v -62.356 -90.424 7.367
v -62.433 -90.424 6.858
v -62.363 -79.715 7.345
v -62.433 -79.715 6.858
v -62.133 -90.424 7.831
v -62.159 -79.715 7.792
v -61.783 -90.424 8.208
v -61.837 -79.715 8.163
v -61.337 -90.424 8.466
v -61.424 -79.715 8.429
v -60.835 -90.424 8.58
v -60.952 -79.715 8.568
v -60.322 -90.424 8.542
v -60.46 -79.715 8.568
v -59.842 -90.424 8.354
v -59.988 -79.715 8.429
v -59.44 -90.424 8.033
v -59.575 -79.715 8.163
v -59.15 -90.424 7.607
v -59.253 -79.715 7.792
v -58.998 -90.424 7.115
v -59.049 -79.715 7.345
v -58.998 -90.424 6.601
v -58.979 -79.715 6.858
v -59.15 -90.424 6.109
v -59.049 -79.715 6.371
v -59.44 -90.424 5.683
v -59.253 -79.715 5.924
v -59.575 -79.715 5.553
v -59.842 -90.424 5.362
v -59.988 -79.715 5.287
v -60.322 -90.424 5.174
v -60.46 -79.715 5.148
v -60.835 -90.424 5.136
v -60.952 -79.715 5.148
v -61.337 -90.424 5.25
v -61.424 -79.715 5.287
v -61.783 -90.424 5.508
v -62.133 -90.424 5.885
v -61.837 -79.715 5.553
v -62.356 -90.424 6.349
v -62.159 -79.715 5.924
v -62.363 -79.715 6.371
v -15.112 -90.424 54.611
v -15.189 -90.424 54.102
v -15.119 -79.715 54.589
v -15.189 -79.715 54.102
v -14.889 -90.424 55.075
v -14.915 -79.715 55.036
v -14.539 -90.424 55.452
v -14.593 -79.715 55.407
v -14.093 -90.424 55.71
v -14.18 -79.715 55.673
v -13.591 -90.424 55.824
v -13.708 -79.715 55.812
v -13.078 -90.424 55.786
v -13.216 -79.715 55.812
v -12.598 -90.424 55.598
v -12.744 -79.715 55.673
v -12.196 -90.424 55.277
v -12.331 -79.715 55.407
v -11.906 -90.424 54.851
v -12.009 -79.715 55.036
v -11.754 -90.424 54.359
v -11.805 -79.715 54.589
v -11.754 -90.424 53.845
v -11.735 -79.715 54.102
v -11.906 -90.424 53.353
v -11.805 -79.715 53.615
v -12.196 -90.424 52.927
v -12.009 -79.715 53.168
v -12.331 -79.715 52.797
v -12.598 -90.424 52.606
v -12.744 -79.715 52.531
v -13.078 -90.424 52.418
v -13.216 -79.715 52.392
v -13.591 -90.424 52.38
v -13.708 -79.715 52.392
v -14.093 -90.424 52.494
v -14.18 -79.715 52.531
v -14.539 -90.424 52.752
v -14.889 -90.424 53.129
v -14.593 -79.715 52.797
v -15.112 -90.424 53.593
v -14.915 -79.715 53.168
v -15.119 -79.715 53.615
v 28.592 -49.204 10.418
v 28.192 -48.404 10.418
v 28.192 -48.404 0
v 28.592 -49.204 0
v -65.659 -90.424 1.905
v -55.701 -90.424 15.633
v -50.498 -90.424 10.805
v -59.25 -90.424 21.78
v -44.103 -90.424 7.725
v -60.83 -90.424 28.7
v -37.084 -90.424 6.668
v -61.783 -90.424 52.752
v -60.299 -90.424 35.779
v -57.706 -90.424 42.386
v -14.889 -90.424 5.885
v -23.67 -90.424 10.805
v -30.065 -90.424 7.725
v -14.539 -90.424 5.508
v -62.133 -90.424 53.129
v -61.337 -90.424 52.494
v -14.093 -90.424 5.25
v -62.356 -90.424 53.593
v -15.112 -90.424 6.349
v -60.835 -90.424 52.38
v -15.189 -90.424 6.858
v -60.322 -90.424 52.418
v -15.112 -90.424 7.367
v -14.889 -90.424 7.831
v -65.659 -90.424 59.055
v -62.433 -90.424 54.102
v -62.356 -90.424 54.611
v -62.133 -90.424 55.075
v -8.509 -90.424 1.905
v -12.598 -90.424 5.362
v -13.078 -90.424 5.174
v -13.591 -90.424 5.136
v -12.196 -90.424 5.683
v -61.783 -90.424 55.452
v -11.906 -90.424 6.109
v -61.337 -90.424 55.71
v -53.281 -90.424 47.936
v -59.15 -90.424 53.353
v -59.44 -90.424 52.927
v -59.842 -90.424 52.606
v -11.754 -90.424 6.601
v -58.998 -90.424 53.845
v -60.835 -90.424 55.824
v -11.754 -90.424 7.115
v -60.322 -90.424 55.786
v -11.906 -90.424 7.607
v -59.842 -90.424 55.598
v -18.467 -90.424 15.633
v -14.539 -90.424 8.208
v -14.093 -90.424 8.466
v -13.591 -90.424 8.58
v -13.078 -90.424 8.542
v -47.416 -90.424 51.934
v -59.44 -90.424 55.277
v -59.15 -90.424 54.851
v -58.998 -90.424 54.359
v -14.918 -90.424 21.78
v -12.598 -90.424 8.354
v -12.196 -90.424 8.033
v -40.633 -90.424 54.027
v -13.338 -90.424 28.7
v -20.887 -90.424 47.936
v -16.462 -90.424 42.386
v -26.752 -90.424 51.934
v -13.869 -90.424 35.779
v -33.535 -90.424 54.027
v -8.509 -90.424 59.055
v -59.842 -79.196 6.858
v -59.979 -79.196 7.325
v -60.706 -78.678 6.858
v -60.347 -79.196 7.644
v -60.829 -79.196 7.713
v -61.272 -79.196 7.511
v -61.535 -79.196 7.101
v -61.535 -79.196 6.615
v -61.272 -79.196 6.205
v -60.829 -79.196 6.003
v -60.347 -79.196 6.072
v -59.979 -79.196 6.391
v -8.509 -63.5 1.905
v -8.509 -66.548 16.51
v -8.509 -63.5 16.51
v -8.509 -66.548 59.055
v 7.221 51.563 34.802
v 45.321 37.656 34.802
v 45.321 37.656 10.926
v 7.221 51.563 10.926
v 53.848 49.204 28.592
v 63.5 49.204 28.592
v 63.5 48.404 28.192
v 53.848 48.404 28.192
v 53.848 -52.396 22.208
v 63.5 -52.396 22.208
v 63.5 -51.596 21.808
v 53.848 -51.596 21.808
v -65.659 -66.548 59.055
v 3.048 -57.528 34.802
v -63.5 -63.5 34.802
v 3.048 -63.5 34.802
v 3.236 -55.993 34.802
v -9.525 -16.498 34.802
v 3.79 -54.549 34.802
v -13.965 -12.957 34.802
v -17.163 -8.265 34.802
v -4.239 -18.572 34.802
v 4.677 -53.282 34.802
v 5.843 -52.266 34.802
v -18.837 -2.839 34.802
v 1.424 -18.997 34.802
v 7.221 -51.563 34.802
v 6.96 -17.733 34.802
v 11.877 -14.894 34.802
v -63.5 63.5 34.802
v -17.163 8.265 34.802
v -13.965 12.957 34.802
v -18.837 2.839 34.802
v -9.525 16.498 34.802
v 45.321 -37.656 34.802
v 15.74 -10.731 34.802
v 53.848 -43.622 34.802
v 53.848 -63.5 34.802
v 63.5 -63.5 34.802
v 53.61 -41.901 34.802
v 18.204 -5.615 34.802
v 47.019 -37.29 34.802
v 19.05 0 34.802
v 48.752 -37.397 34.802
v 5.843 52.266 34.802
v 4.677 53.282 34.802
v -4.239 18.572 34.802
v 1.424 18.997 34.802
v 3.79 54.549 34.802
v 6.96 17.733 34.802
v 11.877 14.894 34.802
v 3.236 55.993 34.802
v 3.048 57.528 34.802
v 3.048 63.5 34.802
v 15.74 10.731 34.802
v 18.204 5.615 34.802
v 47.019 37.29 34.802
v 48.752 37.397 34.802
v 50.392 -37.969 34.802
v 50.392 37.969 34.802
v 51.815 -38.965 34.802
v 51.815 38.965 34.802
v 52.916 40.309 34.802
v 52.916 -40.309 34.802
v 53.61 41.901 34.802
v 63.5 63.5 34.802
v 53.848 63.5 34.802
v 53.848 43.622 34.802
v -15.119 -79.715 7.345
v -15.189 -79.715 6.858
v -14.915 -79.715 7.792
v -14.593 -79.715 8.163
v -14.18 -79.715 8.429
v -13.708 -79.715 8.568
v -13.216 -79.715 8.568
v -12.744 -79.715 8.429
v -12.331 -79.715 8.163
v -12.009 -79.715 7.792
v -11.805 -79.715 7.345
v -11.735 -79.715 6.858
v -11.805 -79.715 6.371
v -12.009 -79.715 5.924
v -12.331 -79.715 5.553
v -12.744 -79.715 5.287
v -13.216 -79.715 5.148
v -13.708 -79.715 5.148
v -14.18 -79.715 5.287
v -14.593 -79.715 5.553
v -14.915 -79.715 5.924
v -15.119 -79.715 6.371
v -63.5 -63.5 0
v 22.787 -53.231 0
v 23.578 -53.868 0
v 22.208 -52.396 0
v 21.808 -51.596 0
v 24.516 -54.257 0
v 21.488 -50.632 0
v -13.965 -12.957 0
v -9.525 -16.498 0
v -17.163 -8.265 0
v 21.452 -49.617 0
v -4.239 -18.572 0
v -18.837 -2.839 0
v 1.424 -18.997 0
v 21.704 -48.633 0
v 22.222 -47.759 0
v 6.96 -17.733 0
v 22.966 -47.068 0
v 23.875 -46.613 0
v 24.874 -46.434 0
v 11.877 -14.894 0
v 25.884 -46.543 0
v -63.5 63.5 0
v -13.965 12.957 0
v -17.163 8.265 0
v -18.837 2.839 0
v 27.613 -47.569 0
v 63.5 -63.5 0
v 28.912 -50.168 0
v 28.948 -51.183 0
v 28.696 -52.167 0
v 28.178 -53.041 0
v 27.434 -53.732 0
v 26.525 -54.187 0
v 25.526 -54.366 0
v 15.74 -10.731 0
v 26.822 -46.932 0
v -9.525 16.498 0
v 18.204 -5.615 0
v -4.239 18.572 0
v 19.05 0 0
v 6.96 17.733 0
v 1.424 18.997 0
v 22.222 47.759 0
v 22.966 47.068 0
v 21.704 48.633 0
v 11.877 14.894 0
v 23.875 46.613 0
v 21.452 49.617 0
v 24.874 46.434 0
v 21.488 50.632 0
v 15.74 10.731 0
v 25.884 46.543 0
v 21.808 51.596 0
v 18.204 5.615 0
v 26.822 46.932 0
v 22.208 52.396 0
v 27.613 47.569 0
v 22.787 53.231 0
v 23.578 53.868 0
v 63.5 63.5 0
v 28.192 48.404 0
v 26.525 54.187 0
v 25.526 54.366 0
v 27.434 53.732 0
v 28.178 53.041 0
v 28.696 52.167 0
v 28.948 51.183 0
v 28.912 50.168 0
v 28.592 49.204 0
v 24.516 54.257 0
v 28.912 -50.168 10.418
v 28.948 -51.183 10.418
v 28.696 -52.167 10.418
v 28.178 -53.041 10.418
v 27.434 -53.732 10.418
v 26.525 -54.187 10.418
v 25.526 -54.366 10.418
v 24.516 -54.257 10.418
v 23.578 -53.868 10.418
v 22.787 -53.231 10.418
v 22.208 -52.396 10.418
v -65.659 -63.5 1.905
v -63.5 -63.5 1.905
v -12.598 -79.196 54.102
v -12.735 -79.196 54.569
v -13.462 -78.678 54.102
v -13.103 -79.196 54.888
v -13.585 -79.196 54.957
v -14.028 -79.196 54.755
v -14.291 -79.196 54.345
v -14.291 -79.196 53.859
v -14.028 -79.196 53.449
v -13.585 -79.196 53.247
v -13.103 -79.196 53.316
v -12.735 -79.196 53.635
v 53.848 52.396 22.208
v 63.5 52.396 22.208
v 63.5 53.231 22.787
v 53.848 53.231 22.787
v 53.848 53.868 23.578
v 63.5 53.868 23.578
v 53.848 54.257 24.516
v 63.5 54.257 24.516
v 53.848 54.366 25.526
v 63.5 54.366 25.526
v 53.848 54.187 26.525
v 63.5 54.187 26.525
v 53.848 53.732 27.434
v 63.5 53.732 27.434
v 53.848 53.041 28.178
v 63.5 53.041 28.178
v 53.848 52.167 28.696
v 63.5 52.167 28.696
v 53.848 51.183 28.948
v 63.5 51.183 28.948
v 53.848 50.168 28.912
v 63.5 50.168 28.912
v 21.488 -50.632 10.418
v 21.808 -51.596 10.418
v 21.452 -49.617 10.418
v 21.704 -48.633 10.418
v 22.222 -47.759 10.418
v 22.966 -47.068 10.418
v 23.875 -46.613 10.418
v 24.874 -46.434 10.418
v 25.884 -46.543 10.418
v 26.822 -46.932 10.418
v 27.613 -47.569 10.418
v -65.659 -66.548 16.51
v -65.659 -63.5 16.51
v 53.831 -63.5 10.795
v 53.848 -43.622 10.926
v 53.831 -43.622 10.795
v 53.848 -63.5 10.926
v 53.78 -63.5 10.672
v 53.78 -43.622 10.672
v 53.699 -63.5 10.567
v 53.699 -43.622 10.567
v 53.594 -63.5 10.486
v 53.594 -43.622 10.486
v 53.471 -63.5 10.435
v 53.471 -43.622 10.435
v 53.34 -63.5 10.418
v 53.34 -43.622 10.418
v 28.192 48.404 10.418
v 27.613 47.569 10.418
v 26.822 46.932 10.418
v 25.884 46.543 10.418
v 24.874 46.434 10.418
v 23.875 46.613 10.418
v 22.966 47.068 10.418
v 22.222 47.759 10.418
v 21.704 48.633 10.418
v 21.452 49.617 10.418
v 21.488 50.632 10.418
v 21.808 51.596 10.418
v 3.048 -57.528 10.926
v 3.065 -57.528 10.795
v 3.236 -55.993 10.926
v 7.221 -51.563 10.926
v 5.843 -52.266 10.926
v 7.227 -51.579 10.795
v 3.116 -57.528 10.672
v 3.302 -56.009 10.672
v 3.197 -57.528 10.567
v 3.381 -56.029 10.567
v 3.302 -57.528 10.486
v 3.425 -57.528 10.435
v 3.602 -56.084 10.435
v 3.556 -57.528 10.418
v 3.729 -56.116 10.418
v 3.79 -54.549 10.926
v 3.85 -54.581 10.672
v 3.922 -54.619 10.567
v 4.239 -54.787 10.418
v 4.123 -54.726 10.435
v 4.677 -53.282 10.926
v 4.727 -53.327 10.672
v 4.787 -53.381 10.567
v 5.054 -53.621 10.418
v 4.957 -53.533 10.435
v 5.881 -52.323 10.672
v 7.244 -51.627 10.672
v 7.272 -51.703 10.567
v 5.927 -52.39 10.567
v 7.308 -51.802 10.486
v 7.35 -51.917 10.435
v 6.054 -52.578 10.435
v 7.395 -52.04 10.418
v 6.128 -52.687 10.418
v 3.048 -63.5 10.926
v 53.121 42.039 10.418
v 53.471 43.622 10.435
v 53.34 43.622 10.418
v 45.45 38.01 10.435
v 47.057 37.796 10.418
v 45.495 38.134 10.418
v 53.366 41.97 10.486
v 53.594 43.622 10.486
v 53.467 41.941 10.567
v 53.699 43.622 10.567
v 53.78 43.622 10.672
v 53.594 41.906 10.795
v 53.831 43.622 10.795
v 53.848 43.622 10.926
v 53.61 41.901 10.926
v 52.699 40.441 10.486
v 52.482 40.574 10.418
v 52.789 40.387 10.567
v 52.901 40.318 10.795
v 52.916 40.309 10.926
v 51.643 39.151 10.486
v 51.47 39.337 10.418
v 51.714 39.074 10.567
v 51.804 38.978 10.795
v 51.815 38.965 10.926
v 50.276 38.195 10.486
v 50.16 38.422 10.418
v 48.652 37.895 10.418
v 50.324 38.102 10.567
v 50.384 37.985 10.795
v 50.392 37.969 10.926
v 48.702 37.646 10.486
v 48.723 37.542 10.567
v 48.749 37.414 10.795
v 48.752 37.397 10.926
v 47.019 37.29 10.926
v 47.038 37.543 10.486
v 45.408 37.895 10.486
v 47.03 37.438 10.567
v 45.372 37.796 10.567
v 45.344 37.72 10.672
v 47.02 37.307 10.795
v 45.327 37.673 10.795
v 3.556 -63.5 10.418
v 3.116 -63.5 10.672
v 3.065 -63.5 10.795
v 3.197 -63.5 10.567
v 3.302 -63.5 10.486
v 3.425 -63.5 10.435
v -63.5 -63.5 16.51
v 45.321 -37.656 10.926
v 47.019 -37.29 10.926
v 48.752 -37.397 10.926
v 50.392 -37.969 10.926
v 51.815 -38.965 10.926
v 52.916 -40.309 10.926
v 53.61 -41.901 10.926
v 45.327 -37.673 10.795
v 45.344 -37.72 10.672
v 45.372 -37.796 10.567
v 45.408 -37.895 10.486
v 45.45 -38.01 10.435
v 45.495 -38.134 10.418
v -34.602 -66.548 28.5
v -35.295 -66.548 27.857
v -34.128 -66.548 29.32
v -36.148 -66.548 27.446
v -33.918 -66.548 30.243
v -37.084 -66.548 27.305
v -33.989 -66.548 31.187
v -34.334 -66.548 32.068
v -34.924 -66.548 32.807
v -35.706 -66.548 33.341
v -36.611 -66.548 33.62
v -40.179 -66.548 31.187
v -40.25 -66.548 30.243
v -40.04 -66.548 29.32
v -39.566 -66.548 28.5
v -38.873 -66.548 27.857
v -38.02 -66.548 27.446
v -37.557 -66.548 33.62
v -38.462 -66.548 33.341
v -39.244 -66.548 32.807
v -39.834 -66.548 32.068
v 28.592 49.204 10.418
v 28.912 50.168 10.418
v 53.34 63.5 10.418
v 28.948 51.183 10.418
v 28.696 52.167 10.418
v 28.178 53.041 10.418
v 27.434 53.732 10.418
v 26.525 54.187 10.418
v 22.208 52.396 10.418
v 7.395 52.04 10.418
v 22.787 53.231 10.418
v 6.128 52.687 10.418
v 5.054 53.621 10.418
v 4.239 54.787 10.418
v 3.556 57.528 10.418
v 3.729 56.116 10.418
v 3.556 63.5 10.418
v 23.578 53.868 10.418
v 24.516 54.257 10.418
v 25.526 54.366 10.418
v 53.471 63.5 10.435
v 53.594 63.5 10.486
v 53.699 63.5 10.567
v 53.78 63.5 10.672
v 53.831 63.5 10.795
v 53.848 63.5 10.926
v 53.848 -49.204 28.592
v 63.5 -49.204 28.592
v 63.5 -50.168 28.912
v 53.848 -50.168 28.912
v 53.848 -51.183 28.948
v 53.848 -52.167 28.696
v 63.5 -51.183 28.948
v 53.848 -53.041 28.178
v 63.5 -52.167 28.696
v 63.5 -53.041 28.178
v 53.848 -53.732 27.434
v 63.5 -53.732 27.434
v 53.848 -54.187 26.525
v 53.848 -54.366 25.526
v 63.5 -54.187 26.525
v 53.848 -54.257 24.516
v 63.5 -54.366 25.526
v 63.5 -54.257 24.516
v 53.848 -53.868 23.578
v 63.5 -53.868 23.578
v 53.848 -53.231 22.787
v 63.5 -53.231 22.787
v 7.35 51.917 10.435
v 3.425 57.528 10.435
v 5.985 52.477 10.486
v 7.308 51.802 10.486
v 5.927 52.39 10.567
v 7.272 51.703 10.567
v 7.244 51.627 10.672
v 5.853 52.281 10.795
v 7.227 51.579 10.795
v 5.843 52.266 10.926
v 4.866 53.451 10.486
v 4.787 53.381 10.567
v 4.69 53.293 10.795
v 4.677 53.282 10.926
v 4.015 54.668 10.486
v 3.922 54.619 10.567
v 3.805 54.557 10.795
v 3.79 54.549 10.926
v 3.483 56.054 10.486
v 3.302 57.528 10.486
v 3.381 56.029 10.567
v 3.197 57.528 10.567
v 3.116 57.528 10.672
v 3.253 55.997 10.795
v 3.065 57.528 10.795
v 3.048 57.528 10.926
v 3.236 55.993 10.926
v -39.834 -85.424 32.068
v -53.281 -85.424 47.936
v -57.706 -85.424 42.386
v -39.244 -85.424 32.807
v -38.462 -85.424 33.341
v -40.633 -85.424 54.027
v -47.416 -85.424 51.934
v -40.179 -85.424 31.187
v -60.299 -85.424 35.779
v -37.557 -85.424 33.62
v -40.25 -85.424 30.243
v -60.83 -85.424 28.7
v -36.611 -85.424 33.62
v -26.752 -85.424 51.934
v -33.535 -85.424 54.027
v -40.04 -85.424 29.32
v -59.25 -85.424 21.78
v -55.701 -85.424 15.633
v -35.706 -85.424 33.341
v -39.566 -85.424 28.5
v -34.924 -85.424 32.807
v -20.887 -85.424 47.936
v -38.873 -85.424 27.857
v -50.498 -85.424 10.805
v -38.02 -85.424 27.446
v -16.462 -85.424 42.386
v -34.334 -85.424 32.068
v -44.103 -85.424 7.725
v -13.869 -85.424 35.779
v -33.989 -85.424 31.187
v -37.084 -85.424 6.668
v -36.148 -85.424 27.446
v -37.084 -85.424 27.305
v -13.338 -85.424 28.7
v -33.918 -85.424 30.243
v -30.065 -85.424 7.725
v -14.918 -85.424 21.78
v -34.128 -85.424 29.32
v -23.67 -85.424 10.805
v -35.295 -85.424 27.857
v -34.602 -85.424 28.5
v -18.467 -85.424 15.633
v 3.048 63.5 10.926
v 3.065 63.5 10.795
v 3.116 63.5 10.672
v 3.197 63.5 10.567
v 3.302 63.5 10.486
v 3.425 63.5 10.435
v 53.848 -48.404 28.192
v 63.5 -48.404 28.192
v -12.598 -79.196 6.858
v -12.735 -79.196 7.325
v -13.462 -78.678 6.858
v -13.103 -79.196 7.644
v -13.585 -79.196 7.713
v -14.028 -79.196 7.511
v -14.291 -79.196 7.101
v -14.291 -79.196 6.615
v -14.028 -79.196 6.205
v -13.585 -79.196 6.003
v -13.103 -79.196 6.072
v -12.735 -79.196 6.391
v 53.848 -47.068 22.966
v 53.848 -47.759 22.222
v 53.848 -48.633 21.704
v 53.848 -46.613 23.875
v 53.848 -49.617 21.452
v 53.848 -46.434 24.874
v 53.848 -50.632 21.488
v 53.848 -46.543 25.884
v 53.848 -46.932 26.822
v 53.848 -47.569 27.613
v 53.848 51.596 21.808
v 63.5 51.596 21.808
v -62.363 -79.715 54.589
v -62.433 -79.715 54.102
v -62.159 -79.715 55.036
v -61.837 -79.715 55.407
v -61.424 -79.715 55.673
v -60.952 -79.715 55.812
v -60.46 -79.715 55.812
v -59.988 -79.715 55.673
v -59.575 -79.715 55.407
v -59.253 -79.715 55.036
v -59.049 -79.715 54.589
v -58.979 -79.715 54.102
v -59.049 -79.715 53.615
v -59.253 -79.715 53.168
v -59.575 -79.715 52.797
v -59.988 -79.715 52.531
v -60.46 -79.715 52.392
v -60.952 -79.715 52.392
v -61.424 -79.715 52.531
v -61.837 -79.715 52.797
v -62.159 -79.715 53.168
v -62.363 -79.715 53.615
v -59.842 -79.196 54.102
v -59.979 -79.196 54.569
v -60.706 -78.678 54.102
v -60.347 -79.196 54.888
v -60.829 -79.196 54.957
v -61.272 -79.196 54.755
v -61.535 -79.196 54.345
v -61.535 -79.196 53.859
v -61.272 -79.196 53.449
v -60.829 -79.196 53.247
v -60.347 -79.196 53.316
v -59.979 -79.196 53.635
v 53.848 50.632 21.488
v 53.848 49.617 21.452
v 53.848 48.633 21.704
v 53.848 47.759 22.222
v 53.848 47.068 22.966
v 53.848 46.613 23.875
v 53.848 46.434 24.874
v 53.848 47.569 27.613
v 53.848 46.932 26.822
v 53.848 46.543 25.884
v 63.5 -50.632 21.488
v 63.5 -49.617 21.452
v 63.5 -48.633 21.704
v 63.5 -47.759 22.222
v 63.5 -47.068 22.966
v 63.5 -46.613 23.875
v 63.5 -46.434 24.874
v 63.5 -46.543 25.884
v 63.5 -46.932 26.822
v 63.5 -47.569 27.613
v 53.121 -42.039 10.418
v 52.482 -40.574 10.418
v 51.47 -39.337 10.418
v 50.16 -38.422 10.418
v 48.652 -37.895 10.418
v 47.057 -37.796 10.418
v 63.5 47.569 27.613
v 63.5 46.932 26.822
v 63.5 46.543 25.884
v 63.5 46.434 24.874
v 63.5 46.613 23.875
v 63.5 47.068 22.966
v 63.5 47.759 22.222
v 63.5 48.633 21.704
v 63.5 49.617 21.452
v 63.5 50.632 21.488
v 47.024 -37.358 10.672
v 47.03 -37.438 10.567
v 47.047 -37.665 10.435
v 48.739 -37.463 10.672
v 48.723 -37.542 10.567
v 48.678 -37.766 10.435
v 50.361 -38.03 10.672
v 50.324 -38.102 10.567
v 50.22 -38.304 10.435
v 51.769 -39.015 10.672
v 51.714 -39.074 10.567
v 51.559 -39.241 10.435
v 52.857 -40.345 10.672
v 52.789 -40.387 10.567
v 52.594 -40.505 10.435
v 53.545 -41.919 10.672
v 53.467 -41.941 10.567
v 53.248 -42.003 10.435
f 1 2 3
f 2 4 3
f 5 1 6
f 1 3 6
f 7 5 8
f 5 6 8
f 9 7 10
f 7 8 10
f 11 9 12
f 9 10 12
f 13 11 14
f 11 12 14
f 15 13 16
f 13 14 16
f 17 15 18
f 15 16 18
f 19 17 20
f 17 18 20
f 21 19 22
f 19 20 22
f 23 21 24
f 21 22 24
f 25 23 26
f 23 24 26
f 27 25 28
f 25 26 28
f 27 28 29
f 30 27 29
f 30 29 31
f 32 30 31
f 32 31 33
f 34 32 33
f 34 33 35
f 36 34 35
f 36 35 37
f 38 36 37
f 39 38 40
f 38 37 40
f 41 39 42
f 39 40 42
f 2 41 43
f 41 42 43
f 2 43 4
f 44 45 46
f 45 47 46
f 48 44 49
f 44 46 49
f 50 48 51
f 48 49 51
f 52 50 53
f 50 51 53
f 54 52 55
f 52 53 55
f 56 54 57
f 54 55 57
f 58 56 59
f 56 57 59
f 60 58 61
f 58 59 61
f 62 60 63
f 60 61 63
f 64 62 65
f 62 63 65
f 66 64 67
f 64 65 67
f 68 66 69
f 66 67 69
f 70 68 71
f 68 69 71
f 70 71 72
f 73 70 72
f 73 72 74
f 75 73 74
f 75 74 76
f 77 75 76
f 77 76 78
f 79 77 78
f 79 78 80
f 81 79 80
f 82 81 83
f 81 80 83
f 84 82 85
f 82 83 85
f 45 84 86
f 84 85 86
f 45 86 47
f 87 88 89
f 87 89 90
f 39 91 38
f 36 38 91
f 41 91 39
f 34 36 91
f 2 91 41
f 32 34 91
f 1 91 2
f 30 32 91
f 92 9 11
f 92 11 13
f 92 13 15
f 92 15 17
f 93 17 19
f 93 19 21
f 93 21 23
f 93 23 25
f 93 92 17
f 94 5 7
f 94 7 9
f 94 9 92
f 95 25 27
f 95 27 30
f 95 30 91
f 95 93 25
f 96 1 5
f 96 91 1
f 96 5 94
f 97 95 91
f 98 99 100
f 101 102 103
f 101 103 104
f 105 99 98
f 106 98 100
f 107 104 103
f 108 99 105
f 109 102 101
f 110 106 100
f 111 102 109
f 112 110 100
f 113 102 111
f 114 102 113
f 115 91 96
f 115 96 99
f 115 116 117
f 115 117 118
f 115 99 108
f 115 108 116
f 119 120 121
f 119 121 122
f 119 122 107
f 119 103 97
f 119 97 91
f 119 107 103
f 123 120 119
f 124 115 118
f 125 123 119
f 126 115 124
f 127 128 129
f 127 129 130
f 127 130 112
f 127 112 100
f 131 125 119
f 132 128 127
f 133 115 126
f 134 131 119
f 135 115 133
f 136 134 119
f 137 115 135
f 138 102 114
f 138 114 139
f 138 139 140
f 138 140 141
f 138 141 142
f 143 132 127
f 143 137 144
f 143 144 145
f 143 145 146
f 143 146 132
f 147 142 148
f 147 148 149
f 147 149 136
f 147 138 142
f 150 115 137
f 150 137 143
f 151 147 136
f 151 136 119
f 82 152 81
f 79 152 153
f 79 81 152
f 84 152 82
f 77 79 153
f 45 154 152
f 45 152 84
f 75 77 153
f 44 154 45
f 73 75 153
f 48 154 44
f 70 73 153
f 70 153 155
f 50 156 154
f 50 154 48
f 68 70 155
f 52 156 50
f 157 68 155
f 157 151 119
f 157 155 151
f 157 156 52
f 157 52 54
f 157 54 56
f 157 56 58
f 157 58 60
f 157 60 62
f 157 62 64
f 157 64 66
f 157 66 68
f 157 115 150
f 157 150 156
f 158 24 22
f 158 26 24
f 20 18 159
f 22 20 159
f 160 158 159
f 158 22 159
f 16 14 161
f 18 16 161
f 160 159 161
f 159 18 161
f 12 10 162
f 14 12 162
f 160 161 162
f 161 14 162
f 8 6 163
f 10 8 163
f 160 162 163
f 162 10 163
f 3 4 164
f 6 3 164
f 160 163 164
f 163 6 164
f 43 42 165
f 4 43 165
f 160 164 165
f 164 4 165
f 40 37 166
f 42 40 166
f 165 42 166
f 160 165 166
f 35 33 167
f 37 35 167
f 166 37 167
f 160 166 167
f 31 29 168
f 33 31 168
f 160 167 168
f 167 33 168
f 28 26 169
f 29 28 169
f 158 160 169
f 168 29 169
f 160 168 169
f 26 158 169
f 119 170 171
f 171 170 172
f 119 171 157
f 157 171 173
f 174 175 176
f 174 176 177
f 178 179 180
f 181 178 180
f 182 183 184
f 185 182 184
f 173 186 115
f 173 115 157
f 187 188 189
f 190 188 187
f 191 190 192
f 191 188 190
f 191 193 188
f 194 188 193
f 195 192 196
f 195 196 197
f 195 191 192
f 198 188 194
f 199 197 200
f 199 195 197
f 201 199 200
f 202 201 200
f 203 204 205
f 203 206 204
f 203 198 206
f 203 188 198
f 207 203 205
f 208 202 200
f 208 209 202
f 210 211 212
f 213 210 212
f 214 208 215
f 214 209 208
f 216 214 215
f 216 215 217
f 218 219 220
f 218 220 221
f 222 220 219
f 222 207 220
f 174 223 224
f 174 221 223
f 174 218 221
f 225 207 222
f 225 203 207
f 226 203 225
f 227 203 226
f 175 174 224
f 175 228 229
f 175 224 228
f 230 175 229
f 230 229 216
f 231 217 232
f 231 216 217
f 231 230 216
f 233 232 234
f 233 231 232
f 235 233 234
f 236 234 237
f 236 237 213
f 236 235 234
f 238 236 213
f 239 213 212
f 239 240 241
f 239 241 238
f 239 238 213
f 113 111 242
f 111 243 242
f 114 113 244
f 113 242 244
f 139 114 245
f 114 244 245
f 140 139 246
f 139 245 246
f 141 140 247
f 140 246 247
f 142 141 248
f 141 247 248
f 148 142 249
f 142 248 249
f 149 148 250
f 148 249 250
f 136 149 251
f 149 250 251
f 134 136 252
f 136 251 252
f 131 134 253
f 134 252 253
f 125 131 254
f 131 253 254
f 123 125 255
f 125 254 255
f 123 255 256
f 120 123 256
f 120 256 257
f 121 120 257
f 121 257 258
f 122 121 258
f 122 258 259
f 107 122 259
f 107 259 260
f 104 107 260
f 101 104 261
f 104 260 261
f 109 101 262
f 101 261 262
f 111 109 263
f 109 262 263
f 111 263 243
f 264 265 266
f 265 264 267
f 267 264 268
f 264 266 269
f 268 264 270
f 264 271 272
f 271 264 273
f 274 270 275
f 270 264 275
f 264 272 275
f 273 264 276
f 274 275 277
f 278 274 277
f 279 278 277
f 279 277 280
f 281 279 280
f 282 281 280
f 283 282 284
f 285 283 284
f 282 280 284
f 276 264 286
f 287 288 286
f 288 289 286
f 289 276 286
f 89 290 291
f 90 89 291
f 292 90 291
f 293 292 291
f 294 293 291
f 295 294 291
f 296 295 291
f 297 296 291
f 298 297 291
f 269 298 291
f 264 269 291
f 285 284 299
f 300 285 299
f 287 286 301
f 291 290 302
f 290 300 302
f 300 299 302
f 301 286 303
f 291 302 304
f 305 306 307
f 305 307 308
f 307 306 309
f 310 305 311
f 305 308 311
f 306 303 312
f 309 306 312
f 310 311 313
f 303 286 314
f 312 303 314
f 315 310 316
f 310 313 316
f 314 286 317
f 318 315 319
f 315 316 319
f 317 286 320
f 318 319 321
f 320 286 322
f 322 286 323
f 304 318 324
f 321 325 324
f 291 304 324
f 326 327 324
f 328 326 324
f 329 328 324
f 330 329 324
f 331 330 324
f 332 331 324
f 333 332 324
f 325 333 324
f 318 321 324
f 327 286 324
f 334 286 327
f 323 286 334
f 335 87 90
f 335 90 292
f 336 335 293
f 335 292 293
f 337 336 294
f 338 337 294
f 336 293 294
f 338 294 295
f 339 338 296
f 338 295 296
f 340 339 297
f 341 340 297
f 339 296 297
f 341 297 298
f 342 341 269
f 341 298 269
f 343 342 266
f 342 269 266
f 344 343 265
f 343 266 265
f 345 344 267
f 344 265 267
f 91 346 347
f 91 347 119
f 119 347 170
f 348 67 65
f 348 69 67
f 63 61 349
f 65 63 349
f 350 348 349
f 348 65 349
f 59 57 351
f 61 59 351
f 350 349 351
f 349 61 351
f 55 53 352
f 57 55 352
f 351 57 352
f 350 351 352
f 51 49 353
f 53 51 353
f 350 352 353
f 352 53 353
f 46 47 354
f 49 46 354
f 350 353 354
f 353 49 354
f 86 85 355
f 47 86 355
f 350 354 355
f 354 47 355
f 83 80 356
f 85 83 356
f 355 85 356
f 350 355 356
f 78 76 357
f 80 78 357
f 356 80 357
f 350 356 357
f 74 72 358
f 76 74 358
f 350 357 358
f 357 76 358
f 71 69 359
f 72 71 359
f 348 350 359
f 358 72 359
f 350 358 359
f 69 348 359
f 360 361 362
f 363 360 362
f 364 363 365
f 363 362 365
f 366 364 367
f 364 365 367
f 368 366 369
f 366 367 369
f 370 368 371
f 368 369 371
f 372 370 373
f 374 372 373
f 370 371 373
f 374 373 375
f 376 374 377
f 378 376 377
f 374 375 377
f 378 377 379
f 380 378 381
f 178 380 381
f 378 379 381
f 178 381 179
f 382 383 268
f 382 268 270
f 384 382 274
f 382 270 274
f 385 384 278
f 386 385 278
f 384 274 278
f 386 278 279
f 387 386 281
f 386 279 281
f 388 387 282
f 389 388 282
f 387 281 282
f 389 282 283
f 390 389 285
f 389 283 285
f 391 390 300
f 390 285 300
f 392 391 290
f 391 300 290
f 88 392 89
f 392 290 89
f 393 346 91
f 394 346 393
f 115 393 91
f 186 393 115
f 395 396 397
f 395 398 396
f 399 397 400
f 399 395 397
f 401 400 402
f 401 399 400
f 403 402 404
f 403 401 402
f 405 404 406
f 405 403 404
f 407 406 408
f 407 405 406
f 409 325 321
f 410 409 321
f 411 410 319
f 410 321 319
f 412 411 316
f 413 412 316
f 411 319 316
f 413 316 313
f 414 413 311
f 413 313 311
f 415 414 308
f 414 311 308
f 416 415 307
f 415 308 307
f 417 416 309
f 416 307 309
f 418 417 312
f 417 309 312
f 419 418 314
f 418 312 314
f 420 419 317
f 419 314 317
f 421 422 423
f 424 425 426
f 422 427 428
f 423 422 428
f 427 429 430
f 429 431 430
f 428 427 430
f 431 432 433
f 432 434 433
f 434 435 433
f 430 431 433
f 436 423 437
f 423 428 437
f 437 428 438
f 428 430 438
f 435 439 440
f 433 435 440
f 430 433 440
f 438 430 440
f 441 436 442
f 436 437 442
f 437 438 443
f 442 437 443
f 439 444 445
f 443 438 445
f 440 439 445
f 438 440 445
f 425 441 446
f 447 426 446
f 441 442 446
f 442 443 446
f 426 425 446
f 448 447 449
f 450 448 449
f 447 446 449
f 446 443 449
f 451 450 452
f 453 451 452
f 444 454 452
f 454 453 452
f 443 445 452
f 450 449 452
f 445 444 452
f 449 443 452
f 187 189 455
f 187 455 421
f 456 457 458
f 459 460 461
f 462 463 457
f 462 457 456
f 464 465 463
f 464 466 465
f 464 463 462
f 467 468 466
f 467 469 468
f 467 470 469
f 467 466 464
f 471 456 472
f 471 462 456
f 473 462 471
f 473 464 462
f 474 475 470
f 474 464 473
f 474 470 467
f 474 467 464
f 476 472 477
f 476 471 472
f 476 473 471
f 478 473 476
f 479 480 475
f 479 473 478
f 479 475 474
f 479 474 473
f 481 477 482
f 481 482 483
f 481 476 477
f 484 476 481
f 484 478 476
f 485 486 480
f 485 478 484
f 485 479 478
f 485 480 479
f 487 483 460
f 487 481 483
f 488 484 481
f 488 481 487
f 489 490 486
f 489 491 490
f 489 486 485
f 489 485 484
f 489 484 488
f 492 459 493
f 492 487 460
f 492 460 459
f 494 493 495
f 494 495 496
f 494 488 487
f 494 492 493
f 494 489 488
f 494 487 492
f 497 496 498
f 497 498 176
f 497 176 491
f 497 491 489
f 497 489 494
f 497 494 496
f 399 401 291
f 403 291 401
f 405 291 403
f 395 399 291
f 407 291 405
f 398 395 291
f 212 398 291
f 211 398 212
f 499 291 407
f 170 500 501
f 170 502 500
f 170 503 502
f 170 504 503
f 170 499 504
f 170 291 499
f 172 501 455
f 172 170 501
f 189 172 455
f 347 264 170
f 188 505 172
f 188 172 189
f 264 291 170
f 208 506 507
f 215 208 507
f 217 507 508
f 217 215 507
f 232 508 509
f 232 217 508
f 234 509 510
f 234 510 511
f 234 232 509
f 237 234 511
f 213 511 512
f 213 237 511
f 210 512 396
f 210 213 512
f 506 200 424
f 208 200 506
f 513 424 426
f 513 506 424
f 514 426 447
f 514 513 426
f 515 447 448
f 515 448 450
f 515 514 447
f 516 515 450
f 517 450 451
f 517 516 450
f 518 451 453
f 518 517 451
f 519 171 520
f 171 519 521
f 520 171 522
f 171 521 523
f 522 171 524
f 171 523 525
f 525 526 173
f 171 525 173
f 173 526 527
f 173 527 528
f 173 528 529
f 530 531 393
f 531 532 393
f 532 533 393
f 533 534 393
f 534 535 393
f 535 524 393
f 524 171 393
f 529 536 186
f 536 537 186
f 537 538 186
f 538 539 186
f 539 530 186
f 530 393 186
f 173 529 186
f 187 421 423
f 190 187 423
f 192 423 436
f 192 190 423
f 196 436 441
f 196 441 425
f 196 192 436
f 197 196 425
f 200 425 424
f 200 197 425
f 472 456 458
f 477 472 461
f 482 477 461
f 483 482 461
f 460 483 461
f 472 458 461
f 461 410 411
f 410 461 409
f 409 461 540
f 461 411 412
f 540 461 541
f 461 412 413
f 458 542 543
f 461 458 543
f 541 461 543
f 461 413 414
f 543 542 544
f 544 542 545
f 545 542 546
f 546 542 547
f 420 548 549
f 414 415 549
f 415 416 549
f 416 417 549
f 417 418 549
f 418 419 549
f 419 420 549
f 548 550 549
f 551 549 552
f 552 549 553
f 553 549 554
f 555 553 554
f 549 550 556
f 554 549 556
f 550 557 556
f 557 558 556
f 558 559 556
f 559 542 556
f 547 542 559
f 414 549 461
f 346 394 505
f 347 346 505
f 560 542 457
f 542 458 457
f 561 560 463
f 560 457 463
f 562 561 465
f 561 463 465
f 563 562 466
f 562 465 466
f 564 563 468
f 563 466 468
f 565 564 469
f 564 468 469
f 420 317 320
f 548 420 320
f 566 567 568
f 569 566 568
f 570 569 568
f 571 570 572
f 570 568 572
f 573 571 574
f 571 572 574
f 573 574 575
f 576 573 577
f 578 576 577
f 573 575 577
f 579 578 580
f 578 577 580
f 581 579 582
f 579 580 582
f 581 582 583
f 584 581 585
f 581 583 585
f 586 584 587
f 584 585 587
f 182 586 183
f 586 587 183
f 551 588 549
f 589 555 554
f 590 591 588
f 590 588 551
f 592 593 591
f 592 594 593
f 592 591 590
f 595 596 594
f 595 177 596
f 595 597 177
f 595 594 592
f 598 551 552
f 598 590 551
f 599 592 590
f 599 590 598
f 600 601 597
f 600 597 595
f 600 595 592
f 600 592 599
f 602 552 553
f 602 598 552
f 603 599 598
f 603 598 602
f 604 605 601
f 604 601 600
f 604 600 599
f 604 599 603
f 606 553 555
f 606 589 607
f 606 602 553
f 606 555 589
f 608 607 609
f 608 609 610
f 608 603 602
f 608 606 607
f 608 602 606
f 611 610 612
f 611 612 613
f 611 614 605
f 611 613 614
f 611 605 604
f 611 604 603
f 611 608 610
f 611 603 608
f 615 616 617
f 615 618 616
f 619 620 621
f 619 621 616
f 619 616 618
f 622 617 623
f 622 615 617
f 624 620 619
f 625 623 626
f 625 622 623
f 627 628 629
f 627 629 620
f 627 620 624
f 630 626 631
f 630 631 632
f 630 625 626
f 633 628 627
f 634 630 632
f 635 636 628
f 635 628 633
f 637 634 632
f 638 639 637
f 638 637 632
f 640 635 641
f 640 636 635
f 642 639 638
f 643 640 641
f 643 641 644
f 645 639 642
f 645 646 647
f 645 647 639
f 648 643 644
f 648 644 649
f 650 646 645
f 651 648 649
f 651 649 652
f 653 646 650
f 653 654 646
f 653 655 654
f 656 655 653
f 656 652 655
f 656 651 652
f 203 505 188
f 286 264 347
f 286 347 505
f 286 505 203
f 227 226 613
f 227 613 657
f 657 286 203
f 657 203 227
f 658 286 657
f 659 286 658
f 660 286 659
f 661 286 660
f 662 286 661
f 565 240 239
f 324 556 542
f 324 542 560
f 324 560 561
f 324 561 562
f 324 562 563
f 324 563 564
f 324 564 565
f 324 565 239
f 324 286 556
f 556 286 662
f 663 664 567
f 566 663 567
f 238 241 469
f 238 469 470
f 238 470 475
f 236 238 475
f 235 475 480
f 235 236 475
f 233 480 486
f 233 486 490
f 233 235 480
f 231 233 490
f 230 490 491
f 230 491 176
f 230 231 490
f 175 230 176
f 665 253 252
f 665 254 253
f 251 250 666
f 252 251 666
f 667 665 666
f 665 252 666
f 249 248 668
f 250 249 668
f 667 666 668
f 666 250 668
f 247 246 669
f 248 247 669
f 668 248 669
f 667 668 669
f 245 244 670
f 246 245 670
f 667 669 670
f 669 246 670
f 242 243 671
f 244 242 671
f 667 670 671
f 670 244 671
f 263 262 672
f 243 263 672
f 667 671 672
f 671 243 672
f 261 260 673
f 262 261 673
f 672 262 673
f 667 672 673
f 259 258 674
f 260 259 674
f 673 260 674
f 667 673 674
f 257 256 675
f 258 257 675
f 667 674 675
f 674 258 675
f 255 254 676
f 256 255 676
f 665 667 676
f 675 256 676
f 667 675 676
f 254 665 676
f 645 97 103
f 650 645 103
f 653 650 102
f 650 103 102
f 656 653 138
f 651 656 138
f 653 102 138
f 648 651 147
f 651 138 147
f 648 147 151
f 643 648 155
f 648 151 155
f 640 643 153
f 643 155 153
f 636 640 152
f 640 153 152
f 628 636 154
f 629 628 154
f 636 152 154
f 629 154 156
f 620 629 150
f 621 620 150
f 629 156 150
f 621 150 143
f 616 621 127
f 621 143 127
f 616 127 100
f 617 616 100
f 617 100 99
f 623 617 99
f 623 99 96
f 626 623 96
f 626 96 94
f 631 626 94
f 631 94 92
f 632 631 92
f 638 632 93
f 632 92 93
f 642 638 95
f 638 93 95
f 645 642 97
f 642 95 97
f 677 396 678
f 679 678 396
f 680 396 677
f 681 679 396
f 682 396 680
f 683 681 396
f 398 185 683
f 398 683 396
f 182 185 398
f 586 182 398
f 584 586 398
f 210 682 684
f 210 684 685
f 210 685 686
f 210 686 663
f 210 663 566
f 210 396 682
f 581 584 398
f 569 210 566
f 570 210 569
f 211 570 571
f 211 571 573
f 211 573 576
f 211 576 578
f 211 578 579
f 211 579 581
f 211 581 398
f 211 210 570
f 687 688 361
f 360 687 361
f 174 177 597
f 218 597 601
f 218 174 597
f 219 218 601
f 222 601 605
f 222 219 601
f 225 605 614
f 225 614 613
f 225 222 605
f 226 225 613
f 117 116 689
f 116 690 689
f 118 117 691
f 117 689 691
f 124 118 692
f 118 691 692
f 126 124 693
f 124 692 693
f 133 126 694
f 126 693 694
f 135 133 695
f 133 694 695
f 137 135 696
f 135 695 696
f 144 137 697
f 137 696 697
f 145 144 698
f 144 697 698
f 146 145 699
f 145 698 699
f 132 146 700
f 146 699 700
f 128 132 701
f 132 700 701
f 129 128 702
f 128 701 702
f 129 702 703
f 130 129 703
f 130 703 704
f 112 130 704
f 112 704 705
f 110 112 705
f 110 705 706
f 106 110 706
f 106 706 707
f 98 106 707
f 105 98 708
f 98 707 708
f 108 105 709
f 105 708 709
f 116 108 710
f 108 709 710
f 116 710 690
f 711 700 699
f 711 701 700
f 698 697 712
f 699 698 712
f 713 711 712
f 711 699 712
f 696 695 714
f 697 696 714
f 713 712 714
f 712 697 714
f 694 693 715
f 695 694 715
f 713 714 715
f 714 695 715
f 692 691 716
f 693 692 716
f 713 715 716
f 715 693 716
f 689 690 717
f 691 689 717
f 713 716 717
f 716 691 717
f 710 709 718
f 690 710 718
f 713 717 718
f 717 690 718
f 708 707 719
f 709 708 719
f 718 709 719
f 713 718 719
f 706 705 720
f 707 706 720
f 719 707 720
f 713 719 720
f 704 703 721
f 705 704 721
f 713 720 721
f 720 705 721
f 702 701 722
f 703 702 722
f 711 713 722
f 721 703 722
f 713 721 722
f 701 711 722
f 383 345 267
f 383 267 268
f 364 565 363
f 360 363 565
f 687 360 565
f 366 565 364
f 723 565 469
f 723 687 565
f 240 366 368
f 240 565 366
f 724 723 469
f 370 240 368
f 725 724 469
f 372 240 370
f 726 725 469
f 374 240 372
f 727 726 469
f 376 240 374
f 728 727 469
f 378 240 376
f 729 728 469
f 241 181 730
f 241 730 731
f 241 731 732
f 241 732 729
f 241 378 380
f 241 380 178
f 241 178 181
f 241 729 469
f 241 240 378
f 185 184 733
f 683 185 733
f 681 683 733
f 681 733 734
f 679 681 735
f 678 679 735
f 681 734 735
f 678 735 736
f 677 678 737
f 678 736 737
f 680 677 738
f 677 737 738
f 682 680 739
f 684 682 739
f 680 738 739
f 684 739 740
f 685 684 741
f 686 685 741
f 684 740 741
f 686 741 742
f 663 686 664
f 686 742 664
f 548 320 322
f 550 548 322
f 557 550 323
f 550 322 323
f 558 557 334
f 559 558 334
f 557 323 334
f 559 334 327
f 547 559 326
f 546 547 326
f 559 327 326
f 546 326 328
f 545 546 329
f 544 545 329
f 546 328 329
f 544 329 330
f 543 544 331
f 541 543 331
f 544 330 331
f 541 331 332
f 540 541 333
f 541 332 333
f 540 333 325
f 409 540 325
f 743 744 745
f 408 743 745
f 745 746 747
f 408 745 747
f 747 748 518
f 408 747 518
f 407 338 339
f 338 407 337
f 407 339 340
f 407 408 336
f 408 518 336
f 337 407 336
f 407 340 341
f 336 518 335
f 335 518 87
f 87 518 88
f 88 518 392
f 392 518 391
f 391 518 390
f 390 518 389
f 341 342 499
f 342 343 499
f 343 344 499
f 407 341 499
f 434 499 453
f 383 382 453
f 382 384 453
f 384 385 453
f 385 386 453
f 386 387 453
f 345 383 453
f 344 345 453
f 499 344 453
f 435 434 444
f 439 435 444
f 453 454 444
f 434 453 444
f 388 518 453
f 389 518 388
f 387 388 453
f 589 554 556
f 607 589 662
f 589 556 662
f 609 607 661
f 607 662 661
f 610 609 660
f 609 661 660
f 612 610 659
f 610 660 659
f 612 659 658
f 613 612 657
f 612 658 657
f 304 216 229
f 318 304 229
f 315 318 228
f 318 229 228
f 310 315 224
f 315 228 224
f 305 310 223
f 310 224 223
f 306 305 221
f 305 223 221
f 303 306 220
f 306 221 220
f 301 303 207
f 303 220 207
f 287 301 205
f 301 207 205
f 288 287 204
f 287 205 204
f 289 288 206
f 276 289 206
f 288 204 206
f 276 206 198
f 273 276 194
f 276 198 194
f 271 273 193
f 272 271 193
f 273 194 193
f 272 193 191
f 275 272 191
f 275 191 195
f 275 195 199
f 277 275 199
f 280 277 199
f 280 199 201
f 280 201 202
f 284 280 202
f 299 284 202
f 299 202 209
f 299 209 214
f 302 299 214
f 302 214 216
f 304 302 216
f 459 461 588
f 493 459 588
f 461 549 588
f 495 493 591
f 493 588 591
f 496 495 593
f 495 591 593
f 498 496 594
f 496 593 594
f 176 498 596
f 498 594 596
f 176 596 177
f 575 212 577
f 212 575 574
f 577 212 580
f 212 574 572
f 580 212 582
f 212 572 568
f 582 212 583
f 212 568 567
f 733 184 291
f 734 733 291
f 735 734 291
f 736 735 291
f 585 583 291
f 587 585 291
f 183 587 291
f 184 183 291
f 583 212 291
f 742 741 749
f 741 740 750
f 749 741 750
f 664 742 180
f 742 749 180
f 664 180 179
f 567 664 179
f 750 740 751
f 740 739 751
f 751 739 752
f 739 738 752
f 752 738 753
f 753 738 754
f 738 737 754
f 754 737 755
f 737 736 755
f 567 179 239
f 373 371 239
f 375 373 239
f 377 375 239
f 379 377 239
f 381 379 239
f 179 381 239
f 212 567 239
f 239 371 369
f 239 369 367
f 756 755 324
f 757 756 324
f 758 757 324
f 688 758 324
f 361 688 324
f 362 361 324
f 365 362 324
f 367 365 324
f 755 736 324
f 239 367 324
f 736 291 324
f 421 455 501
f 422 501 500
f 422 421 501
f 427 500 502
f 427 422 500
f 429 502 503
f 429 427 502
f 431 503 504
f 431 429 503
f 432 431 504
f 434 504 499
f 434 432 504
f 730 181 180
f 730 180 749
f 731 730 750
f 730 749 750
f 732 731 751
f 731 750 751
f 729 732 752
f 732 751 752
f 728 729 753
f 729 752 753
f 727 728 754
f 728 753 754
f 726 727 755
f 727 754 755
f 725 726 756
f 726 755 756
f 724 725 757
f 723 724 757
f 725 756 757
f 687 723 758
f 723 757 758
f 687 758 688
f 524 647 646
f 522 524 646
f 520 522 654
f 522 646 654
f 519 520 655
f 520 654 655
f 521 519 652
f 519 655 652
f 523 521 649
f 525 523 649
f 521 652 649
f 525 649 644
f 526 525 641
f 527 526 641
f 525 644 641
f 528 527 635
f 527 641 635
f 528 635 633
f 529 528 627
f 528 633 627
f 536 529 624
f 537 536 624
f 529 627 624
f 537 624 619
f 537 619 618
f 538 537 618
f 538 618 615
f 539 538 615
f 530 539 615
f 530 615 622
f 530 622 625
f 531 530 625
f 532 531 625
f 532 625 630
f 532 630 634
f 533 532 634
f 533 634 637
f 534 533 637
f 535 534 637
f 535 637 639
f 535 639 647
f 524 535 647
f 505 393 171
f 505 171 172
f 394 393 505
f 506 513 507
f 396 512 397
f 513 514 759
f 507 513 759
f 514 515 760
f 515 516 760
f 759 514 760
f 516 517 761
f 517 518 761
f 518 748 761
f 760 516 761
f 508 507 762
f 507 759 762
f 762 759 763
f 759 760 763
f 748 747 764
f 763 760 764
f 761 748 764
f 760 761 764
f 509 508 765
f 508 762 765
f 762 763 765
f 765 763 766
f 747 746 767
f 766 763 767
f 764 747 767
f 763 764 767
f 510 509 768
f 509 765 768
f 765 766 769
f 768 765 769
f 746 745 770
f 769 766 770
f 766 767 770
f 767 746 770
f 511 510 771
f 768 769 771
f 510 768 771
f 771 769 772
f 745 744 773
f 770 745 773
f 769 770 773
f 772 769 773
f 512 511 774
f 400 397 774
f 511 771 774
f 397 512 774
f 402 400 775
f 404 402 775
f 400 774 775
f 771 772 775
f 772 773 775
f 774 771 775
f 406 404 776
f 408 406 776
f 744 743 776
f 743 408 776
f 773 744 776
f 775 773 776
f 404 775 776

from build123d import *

# Parameters (mm, degrees)
SKETCH2_W                        = 127
SKETCH2_H                        = 127
HOUSING_DEPTH                    = 39.5
SKETCH4_OUTSIDE_W                = 165.78
SKETCH4_OUTSIDE_H                = 165.78
SKETCH4_OUTSIDE_R                = 45.974
CUT_EXTRUDE2_DEPTH               = 4.698
MOUNTING_POCKETS_DEPTH           = 24.384
ENG_METRIC_SLOT_VERTICAL_REACH   = 160.723
ENG_METRIC_SLOT_HORIZONTAL_DEPTH = 199.381065075
FILLET3_R                        = 0.508
SKETCH213_W                      = 57.15
SKETCH213_H                      = 57.15
EXTRUDE1_DEPTH                   = 26.924
SKETCH214_R                      = 23.8125
CUT_EXTRUDE3_DEPTH               = 5
SKETCH215_R                      = 3.175
CUT_EXTRUDE4_DEPTH               = 21.924
CUT_EXTRUDE5_REACH               = 170.363
SKETCH216_W                      = 42.545
SKETCH216_H                      = 3.048
F_8_32_TAPPED_HOLE1_D            = 3.4544
F_8_32_TAPPED_HOLE1_DEPTH        = 10.7086
F_8_32_TAPPED_HOLE1_TIP          = 1.037806461
SKETCH241_R                      = 45.974
CUT_EXTRUDE7_DEPTH               = 4.698
SKETCH3_R                        = 19.05
CUT_EXTRUDE8_DEPTH               = 122.723587102


with BuildPart() as part:
    # Sketch2 → HOUSING (new body)
    with BuildSketch(Plane.XY):
        Rectangle(SKETCH2_W, SKETCH2_H)
    extrude(amount=HOUSING_DEPTH)

    # Sketch4 outside → Cut-Extrude2 (cut)
    with BuildSketch(Plane.XY.offset(39.5)):
        Rectangle(SKETCH4_OUTSIDE_W, SKETCH4_OUTSIDE_H)
        Circle(SKETCH4_OUTSIDE_R, mode=Mode.SUBTRACT)
    extrude(amount=-CUT_EXTRUDE2_DEPTH, mode=Mode.SUBTRACT)

    # Sketch8 → MOUNTING POCKETS (cut)
    with BuildSketch(Plane.XY.offset(34.802)):
        with BuildLine():
            Line((3.048, -63.5), (3.048, -57.528018122))
            ThreePointArc((3.048, -57.528018122), (4.194729662, -53.888172274), (7.220748912, -51.562946647))
            Line((7.220748912, -51.562946647), (45.320748912, -37.656446647))
            ThreePointArc((45.320748912, -37.656446647), (51.137845848, -38.418247784), (53.848, -43.621518122))
            Line((53.848, -43.621518122), (53.848, -63.5))
            Line((53.848, -63.5), (3.048, -63.5))
        make_face()
        with BuildLine():
            Line((3.048, 63.5), (53.848, 63.5))
            Line((53.848, 63.5), (53.848, 43.621518122))
            ThreePointArc((53.848, 43.621518122), (51.137845848, 38.418247784), (45.320748912, 37.656446647))
            Line((45.320748912, 37.656446647), (7.220748912, 51.562946647))
            ThreePointArc((7.220748912, 51.562946647), (4.194729662, 53.888172274), (3.048, 57.528018122))
            Line((3.048, 57.528018122), (3.048, 63.5))
        make_face()
    extrude(amount=-MOUNTING_POCKETS_DEPTH, mode=Mode.SUBTRACT)

    # Sketch21 → ENG_METRIC SLOT VERTICAL (cut, up to next)
    with BuildSketch(Plane(origin=(63.5, -23.646142673, 1.166551585), x_dir=(0, 0, -1), z_dir=(1, 0, 0)), mode=Mode.PRIVATE) as eng_metric_slot_vertical_sk1:
        with BuildLine():
            Line((-20.641506099, 75.242113831), (-21.041506099, 76.042113831))
            ThreePointArc((-21.041506099, 76.042113831), (-25.829419573, 77.63808499), (-27.425390732, 72.850171515))
            Line((-27.425390732, 72.850171515), (-27.025390732, 72.050171515))
            ThreePointArc((-27.025390732, 72.050171515), (-22.237477257, 70.454200357), (-20.641506099, 75.242113831))
        make_face()
    eng_metric_slot_vertical_tool1 = extrude(eng_metric_slot_vertical_sk1.sketch, amount=-ENG_METRIC_SLOT_VERTICAL_REACH, mode=Mode.PRIVATE) & part.part
    # Sketch21 → ENG_METRIC SLOT VERTICAL (cut, up to next)
    with BuildSketch(Plane(origin=(63.5, -23.646142673, 1.166551585), x_dir=(0, 0, -1), z_dir=(1, 0, 0)), mode=Mode.PRIVATE) as eng_metric_slot_vertical_sk2:
        with BuildLine():
            Line((-27.025390732, -24.757886169), (-27.425390732, -25.557886169))
            ThreePointArc((-27.425390732, -25.557886169), (-25.829419573, -30.345799643), (-21.041506099, -28.749828485))
            Line((-21.041506099, -28.749828485), (-20.641506099, -27.949828485))
            ThreePointArc((-20.641506099, -27.949828485), (-22.237477257, -23.16191501), (-27.025390732, -24.757886169))
        make_face()
    eng_metric_slot_vertical_tool2 = extrude(eng_metric_slot_vertical_sk2.sketch, amount=-ENG_METRIC_SLOT_VERTICAL_REACH, mode=Mode.PRIVATE) & part.part
    add(eng_metric_slot_vertical_tool1.solids().sort_by_distance((63.5, 50.4, 25.2))[0], mode=Mode.SUBTRACT)
    add(eng_metric_slot_vertical_tool2.solids().sort_by_distance((63.5, -50.4, 25.2))[0], mode=Mode.SUBTRACT)

    # Sketch212 → ENG_METRIC SLOT HORIZONTAL (cut, through all)
    with BuildSketch(Plane(origin=(34.062086582, -104.655987826, 0), x_dir=(-1, 0, 0), z_dir=(0, 0, -1))):
        with BuildLine():
            Line((12.254028899, 156.251958985), (11.854028899, 157.051958985))
            ThreePointArc((11.854028899, 157.051958985), (7.066115424, 158.647930143), (5.470144266, 153.860016668))
            Line((5.470144266, 153.860016668), (5.870144266, 153.060016668))
            ThreePointArc((5.870144266, 153.060016668), (10.658057741, 151.46404551), (12.254028899, 156.251958985))
        make_face()
        with BuildLine():
            Line((5.870144266, 56.251958985), (5.470144266, 55.451958985))
            ThreePointArc((5.470144266, 55.451958985), (7.066115424, 50.66404551), (11.854028899, 52.260016668))
            Line((11.854028899, 52.260016668), (12.254028899, 53.060016668))
            ThreePointArc((12.254028899, 53.060016668), (10.658057741, 57.847930143), (5.870144266, 56.251958985))
        make_face()
    extrude(amount=-ENG_METRIC_SLOT_HORIZONTAL_DEPTH, mode=Mode.SUBTRACT)

    # Fillet3
    fillet3_edges = [part.edges().sort_by_distance(p)[0] for p in [
        (3.048, -60.514009061, 10.418),
        (4.194729662, -53.888172274, 10.418),
        (26.270748912, -44.609696647, 10.418),
        (51.137845848, -38.418247784, 10.418),
        (53.848, -53.560759061, 10.418),
        (51.137845848, 38.418247784, 10.418),
        (26.270748912, 44.609696647, 10.418),
        (4.194729662, 53.888172274, 10.418),
        (3.048, 60.514009061, 10.418),
        (53.848, 53.560759061, 10.418),
    ]]
    fillet(fillet3_edges, radius=FILLET3_R)

    # Sketch213 → Extrude1 (add)
    with BuildSketch(Plane.XZ.offset(63.5)):
        with Locations((-37.084, 30.48)):
            Rectangle(SKETCH213_W, SKETCH213_H)
    extrude(amount=EXTRUDE1_DEPTH)

    # Sketch214 → Cut-Extrude3 (cut)
    with BuildSketch(Plane.XZ.offset(90.424)):
        with Locations(Location((-37.084, 30.48, 0), (0, 0, 270))):
            Circle(SKETCH214_R)
    extrude(amount=-CUT_EXTRUDE3_DEPTH, mode=Mode.SUBTRACT)

    # Sketch215 → Cut-Extrude4 (cut)
    with BuildSketch(Plane.XZ.offset(85.424)):
        with Locations(Location((-37.084, 30.48, 0), (0, 0, 270))):
            Circle(SKETCH215_R)
    extrude(amount=-CUT_EXTRUDE4_DEPTH, mode=Mode.SUBTRACT)

    # Sketch216 → Cut-Extrude5 (cut, up to next)
    with BuildSketch(Plane.ZY.offset(65.659), mode=Mode.PRIVATE) as cut_extrude5_sk1:
        with Locations((37.7825, -65.024)):
            Rectangle(SKETCH216_W, SKETCH216_H)
    cut_extrude5_tool1 = extrude(cut_extrude5_sk1.sketch, amount=-CUT_EXTRUDE5_REACH, mode=Mode.PRIVATE) & part.part
    add(cut_extrude5_tool1.solids().sort_by_distance((-65.659, -65.024, 37.7825))[0], mode=Mode.SUBTRACT)

    # #8-32 Tapped Hole1
    with Locations(Plane.XZ.offset(90.424)):
        with Locations((-60.706, 6.858), (-60.706, 54.102), (-13.462, 54.102), (-13.462, 6.858)):
            Hole(F_8_32_TAPPED_HOLE1_D / 2, depth=F_8_32_TAPPED_HOLE1_DEPTH)
            with Locations((0, 0, -(F_8_32_TAPPED_HOLE1_DEPTH + F_8_32_TAPPED_HOLE1_TIP / 2))):  # 118° drill point
                Cone(0, F_8_32_TAPPED_HOLE1_D / 2, F_8_32_TAPPED_HOLE1_TIP, mode=Mode.SUBTRACT)

    # Sketch241 → Cut-Extrude7 (cut)
    with BuildSketch(Plane.XY.offset(39.5)):
        Circle(SKETCH241_R)
    extrude(amount=-CUT_EXTRUDE7_DEPTH, mode=Mode.SUBTRACT)

    # Sketch3 → Cut-Extrude8 (cut, through all)
    with BuildSketch(Plane.XY.offset(48.26)):
        Circle(SKETCH3_R)
    extrude(amount=-CUT_EXTRUDE8_DEPTH, mode=Mode.SUBTRACT)


solid = part.part
